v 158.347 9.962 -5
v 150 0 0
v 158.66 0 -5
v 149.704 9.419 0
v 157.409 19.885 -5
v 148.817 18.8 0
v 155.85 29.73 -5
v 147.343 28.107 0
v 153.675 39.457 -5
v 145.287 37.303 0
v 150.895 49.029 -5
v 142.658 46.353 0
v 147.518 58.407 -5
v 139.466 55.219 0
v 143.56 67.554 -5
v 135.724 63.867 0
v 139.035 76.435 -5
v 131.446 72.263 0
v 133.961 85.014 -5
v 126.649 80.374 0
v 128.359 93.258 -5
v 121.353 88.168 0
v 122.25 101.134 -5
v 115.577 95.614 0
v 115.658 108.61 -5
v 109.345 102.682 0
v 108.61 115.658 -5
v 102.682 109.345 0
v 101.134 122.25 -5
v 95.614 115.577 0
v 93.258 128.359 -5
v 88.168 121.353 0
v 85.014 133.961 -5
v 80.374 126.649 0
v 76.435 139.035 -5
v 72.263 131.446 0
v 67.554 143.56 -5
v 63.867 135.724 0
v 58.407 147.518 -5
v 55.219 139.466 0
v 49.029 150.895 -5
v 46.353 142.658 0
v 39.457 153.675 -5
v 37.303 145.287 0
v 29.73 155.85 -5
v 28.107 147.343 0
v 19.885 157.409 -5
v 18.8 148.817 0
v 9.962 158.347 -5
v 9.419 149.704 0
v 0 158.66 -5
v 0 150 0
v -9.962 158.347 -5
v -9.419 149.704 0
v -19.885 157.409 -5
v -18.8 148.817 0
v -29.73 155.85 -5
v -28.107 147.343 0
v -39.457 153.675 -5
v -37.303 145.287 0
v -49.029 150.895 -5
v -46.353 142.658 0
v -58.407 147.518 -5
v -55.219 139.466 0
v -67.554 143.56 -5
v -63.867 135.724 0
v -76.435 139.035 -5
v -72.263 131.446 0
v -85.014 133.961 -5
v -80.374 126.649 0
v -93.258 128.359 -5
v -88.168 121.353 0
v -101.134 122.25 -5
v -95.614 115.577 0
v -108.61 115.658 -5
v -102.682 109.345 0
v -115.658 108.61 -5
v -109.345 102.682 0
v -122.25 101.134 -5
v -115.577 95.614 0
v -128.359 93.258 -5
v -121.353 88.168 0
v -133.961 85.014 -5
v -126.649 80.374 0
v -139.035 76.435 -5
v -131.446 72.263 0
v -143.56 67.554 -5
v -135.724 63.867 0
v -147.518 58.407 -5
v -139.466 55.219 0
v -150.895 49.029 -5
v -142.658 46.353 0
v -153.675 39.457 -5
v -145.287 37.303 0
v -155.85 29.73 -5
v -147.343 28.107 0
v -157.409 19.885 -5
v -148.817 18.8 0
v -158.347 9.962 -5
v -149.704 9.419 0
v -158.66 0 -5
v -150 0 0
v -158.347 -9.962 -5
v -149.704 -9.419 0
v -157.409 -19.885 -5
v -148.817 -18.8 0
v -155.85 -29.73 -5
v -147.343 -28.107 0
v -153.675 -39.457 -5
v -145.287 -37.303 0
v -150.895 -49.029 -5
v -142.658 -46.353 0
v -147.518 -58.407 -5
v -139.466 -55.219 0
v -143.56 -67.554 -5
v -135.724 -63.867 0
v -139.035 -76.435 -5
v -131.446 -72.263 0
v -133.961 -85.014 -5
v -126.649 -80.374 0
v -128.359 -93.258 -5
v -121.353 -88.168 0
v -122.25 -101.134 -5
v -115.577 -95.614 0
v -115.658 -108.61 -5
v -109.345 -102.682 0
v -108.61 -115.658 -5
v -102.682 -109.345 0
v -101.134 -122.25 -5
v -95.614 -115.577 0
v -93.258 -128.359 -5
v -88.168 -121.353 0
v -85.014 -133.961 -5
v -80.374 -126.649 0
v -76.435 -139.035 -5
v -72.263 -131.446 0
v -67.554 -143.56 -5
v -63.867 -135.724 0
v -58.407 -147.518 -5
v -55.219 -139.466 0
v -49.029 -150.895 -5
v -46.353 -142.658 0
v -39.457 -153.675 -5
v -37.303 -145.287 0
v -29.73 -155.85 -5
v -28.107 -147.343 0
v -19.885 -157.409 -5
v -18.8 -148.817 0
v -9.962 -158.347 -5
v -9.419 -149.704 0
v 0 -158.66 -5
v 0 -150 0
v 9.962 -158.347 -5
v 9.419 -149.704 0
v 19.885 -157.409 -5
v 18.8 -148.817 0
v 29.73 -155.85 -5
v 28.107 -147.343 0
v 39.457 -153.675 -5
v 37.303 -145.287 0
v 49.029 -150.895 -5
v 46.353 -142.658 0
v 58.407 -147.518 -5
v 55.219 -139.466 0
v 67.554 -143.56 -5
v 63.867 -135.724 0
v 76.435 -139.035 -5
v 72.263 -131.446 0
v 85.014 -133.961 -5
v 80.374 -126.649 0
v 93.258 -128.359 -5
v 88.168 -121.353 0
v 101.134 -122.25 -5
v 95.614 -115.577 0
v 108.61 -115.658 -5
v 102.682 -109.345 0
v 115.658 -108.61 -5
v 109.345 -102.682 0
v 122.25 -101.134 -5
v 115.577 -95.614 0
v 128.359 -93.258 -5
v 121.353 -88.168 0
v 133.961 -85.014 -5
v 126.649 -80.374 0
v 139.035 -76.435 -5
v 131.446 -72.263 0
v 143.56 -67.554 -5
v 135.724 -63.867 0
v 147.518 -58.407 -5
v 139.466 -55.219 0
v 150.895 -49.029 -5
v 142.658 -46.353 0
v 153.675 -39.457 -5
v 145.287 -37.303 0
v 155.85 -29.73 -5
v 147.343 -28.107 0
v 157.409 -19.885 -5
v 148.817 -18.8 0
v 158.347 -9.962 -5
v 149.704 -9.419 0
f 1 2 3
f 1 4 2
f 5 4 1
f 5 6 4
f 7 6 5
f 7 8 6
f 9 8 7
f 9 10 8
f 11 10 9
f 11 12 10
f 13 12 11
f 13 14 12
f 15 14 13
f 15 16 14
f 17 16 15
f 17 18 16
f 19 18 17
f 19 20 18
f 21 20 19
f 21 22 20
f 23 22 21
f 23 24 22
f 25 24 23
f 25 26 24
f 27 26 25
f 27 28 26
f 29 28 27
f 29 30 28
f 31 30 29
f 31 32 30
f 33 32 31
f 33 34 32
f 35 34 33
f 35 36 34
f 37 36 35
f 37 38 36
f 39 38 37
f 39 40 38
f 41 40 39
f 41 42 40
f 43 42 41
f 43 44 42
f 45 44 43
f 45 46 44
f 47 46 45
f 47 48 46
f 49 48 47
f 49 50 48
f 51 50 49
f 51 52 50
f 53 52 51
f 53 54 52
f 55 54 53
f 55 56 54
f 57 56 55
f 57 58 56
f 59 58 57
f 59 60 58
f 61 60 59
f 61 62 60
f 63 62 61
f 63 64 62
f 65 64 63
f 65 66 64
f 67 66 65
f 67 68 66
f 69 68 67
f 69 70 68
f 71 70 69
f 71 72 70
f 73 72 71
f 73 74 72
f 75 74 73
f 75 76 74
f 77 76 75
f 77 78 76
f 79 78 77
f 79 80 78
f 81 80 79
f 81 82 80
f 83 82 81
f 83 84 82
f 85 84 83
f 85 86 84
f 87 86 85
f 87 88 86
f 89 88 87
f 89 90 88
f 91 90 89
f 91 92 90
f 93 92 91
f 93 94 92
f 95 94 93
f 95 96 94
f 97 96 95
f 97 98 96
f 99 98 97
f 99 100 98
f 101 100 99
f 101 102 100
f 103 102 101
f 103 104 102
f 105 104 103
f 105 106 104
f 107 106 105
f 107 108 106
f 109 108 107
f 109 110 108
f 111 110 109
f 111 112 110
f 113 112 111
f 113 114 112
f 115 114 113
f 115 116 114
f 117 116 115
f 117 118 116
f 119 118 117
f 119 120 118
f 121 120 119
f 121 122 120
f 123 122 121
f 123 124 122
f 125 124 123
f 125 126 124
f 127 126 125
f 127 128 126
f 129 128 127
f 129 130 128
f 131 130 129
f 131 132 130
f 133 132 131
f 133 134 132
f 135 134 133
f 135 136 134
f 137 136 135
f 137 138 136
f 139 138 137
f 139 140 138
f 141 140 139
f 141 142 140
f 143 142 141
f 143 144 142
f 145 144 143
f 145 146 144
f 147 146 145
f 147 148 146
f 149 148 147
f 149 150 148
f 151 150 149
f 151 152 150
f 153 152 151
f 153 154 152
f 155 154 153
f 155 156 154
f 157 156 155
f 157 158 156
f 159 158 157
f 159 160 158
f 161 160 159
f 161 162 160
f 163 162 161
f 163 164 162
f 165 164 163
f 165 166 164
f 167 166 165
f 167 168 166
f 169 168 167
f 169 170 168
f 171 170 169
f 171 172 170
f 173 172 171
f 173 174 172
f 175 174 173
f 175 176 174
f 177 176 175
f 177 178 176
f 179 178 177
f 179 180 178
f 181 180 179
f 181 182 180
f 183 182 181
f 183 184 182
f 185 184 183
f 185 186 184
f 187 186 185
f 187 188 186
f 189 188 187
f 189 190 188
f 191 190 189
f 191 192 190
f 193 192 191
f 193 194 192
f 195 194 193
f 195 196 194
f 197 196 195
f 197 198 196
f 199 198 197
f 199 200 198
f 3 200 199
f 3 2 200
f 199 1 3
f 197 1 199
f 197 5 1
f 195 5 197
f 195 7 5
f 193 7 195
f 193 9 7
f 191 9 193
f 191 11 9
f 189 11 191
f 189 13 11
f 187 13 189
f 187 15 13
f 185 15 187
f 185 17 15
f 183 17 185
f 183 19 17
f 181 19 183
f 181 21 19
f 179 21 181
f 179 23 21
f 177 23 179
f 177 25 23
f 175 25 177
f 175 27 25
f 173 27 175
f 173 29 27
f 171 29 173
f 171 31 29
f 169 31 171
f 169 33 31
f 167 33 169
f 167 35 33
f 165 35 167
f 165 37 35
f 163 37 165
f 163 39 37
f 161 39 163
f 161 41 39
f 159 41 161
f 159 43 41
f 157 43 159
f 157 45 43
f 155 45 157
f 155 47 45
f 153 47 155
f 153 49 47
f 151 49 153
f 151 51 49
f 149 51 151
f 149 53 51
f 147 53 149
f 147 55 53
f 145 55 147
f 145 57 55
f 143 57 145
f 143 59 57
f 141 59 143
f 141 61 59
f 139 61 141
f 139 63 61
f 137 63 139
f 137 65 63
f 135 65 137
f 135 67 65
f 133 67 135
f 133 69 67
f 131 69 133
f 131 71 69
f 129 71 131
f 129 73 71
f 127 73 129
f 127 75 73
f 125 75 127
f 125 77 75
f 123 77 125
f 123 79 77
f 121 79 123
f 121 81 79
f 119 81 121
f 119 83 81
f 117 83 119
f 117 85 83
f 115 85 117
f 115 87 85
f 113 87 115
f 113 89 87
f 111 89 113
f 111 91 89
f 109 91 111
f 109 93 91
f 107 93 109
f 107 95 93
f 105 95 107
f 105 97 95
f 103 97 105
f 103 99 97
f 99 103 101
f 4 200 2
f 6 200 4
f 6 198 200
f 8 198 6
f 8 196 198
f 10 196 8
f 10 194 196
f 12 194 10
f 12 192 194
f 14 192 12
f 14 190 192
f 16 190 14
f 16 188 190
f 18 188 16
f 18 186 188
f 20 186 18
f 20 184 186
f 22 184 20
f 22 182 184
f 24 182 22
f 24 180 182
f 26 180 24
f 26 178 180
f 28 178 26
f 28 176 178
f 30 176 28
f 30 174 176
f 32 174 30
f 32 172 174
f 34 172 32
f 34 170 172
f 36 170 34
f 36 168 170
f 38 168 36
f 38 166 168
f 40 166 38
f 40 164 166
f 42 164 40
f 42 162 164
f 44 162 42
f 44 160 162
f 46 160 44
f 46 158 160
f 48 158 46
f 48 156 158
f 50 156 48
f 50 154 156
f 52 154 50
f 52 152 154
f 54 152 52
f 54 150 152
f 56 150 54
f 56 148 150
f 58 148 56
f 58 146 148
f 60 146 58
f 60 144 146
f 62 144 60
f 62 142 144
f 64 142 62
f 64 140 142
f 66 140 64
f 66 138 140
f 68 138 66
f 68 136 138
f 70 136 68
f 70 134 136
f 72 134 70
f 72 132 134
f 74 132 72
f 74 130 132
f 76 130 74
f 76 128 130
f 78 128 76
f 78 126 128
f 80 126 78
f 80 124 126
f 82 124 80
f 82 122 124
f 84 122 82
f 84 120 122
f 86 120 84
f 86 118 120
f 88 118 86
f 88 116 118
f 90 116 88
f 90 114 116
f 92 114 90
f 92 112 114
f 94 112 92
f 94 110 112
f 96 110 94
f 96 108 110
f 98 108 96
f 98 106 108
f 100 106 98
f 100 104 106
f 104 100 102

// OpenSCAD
$fn = 100;

translate([0, 0, 0])
    rotate([0, 0, 0])
        translate([0, 0, -5])
            cylinder(5, 158.66, 150, false);
